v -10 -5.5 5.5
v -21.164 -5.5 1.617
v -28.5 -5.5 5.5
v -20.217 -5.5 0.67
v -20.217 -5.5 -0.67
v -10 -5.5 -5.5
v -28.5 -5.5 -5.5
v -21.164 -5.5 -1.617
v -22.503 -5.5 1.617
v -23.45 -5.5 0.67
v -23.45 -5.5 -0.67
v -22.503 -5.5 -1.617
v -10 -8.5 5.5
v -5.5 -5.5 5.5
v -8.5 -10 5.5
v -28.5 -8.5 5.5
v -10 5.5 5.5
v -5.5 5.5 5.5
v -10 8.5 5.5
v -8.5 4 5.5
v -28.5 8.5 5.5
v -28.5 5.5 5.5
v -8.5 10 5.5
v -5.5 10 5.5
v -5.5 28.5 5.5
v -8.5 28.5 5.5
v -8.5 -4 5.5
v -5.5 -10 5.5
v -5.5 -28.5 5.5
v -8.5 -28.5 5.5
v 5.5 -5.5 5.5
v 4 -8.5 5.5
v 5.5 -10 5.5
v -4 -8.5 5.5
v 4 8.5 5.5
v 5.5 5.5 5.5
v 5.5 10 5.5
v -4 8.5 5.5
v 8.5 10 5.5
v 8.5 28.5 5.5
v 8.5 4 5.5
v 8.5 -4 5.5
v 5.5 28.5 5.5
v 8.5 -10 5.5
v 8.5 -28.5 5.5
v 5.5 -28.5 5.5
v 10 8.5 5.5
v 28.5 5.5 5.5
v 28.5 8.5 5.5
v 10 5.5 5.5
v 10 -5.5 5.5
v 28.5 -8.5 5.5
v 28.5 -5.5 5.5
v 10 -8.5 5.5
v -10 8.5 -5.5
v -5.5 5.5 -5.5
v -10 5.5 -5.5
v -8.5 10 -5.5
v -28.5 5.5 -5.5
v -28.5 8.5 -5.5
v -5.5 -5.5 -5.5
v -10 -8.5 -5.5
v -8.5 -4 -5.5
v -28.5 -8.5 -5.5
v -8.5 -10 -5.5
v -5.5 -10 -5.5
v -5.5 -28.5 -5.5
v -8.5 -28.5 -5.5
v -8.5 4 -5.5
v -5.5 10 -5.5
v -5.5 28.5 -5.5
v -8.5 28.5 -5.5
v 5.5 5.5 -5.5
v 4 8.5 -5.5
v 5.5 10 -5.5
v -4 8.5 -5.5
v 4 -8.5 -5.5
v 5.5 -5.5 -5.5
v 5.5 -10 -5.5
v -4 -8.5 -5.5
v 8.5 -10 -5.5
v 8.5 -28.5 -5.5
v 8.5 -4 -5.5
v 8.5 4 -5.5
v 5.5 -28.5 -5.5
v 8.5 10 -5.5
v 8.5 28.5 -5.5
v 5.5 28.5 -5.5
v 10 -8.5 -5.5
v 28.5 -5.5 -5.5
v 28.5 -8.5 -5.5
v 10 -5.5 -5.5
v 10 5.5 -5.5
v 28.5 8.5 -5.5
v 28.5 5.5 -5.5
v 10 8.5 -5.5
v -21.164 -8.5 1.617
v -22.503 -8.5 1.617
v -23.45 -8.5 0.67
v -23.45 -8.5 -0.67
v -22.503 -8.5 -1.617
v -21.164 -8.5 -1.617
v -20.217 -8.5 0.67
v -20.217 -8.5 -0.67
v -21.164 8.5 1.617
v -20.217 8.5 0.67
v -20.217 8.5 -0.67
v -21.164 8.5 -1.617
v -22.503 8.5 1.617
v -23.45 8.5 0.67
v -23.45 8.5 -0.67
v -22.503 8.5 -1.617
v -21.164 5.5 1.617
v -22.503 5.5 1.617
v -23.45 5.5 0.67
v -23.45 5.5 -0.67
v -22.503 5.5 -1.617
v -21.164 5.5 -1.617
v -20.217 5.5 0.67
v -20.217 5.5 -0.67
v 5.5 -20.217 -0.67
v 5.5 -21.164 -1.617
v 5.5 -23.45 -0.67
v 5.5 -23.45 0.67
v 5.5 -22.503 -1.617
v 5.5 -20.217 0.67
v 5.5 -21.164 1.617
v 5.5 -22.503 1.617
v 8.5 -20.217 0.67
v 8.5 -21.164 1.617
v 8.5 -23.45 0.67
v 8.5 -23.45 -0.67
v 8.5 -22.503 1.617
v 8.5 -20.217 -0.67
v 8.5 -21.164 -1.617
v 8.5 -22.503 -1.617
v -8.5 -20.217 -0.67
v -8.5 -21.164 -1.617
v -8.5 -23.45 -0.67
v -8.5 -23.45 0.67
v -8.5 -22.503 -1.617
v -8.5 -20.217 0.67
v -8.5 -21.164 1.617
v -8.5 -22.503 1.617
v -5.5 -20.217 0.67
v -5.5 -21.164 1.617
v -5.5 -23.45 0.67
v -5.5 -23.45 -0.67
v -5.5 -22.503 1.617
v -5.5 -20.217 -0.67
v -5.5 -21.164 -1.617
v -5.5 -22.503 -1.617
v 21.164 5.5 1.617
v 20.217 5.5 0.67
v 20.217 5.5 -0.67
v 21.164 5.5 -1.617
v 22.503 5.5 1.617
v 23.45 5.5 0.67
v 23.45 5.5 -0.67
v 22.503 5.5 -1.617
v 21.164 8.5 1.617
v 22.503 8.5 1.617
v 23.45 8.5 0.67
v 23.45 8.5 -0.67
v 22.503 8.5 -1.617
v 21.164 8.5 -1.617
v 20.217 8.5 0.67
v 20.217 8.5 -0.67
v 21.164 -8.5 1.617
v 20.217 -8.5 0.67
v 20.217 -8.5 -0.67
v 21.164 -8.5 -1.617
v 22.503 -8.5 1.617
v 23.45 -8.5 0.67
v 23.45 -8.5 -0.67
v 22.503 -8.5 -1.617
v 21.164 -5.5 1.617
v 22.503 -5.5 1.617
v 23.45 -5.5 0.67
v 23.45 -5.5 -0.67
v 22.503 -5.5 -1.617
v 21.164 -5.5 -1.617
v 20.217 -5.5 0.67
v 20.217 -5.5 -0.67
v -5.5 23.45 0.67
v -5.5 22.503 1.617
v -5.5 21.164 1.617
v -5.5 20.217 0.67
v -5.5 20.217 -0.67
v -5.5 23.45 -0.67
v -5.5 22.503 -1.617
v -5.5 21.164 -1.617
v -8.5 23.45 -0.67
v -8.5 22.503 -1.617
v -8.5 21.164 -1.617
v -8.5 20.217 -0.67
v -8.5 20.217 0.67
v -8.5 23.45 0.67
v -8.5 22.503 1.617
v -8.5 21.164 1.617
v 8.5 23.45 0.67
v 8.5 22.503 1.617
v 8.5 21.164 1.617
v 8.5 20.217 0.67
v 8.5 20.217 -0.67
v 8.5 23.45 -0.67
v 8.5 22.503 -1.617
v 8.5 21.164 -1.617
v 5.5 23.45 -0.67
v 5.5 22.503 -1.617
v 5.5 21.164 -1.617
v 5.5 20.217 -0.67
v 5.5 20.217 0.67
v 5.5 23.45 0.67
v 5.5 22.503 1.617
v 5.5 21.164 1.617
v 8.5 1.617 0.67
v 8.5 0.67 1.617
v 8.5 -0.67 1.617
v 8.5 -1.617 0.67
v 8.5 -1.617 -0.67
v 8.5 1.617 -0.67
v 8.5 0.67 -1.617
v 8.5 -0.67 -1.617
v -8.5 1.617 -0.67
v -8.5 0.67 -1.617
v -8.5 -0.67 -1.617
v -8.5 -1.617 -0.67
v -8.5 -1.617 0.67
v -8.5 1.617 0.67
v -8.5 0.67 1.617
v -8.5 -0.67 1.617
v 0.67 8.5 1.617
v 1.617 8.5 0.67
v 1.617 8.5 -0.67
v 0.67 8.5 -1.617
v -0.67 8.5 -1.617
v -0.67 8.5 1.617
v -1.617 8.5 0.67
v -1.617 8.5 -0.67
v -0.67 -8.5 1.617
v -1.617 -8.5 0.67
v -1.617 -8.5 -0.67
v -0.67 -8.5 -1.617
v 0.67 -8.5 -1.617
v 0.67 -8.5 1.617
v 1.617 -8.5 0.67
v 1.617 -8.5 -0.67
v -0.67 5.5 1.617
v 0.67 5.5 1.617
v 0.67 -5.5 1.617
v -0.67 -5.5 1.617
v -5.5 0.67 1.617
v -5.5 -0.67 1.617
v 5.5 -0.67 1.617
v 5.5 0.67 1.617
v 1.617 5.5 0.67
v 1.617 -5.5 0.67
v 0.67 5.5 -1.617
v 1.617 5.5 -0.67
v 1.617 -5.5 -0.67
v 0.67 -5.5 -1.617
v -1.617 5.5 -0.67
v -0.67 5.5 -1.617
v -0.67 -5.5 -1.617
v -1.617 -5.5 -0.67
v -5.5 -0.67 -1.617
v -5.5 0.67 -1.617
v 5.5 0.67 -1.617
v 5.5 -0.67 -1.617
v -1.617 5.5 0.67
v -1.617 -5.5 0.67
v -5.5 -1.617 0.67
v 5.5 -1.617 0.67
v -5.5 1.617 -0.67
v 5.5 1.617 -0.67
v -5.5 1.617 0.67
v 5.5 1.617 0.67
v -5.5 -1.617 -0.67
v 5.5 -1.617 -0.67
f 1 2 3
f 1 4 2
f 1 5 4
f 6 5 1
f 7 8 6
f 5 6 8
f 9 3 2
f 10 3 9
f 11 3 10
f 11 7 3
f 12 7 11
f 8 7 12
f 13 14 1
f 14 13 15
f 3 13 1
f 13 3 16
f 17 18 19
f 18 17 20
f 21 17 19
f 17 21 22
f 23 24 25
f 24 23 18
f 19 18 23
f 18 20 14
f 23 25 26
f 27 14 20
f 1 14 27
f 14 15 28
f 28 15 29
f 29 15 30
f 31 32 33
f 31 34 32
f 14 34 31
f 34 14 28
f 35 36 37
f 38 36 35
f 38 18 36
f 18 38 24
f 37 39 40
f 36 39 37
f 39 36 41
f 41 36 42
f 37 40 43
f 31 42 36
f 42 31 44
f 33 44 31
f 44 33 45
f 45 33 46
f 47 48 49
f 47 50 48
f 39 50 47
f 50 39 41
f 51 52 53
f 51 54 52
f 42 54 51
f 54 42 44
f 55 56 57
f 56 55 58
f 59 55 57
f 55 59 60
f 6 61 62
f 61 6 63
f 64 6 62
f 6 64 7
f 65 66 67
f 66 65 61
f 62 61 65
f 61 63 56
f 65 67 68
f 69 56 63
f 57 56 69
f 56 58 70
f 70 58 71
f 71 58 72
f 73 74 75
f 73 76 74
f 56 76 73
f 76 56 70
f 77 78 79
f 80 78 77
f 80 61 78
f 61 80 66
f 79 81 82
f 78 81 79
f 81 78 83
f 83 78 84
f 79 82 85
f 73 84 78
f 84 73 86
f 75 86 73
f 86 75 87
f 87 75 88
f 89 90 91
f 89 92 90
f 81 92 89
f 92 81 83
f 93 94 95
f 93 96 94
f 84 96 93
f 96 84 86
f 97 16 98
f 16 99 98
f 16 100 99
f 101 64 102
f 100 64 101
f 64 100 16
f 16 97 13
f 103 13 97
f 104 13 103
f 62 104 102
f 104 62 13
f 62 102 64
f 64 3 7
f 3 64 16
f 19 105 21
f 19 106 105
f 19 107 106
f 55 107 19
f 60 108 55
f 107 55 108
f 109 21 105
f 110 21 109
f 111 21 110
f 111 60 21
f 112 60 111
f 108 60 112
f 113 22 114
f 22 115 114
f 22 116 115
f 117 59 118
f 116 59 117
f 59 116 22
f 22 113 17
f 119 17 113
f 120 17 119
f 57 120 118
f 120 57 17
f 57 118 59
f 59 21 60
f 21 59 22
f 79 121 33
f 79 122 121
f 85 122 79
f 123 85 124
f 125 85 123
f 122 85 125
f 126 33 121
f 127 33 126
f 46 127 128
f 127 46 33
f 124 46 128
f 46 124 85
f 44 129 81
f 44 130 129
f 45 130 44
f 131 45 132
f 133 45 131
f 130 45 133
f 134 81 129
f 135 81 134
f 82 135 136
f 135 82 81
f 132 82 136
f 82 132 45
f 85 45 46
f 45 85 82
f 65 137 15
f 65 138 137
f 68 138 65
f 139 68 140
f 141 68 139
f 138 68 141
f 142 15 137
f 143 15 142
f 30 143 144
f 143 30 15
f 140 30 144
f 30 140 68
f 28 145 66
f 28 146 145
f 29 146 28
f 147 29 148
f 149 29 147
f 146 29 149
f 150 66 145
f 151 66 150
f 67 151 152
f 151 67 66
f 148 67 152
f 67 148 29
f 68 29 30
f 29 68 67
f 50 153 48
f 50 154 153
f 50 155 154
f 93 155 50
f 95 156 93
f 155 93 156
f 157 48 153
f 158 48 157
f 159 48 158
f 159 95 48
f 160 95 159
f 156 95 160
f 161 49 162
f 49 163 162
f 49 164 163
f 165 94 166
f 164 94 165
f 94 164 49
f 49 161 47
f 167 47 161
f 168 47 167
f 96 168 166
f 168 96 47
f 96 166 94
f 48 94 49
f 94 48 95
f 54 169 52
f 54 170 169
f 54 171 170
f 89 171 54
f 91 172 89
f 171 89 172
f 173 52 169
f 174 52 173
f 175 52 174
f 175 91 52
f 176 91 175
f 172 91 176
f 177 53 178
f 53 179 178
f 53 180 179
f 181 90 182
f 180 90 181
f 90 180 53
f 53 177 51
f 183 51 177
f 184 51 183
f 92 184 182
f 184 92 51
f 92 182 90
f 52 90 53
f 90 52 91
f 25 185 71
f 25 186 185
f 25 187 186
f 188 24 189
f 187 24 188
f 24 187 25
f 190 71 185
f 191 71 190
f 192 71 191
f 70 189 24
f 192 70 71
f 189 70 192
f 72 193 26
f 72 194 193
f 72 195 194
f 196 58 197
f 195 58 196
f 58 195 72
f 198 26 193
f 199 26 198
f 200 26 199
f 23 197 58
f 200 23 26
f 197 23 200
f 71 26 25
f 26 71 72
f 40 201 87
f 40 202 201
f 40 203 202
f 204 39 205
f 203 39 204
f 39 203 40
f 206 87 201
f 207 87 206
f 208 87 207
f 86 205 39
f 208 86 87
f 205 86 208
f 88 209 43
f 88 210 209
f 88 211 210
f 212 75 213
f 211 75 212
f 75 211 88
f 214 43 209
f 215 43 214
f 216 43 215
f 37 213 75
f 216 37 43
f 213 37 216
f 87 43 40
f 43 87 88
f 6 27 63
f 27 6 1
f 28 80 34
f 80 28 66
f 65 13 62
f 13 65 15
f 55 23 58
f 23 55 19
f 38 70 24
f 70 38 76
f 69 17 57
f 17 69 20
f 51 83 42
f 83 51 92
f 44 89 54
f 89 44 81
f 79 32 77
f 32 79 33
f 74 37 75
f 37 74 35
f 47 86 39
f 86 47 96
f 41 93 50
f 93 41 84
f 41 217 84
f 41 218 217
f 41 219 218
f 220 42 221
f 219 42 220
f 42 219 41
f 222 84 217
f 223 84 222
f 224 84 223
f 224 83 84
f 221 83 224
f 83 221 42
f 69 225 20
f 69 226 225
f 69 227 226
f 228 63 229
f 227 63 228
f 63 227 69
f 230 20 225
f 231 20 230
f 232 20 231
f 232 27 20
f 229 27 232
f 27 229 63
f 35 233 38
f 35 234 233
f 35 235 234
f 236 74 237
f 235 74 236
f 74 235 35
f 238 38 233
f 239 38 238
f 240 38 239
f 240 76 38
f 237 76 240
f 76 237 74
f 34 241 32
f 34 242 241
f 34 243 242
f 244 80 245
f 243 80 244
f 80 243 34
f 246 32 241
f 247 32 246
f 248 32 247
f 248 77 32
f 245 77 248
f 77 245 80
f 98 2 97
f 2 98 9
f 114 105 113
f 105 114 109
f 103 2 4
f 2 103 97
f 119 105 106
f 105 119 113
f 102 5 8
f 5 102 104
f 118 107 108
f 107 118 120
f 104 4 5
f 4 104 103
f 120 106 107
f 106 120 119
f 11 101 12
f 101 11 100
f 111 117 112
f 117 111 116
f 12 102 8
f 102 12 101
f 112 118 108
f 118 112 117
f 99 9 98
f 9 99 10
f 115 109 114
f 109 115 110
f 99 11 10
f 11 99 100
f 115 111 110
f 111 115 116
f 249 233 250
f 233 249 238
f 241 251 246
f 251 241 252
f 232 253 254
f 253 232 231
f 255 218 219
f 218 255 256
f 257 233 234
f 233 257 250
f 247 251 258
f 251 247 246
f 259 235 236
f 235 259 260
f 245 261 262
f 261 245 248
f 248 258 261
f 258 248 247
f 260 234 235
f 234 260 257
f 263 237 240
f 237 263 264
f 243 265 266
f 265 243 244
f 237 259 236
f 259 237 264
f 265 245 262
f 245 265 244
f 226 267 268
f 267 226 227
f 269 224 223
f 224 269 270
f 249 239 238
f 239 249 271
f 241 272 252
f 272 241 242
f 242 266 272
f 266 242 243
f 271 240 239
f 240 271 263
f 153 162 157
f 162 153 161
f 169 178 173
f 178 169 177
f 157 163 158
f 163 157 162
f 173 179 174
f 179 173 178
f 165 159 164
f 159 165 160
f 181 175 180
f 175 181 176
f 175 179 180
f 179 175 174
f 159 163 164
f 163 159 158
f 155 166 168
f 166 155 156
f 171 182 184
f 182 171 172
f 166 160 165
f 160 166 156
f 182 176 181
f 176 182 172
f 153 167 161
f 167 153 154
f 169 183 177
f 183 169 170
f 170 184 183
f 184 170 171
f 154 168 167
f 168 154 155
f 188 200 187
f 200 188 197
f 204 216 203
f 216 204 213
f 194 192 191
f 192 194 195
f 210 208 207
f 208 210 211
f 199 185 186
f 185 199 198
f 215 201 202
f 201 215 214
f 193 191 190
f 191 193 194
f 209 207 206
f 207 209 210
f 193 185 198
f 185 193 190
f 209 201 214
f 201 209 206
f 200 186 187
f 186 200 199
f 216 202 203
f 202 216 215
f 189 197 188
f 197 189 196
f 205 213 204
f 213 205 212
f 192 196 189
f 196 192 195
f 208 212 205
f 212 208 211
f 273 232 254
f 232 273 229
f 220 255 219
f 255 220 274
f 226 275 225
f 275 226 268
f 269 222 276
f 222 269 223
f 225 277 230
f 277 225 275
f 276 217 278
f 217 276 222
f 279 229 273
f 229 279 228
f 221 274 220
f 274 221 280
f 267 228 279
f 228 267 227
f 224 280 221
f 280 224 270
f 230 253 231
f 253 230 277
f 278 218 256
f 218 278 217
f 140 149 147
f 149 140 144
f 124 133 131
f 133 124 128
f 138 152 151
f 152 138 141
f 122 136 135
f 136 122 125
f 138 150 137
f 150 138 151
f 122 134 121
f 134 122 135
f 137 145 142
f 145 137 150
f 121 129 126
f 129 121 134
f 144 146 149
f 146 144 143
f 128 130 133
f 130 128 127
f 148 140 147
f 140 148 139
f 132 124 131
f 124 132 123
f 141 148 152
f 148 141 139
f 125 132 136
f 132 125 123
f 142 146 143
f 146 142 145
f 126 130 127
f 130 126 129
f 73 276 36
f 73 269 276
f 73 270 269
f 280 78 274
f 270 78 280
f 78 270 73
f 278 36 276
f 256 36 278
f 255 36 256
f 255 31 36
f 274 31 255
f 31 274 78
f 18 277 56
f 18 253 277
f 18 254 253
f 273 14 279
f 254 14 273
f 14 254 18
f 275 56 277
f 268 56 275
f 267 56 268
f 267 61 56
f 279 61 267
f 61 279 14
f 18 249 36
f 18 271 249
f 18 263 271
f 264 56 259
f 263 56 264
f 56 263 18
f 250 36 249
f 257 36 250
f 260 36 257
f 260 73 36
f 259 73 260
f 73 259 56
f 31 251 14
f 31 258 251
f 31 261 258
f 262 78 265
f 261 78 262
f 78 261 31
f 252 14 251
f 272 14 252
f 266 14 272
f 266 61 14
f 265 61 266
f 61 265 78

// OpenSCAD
// beam width
w = 11;

// beam support length
l = 20;

// hole diameter
p = 3.5;

// material thickness
t = 3;

// 3 or 4 way joint
n = 4; // [ 2, 3, 4 ]

$fn = 8;


difference()
{
	union()
	{
		for ( z = [ 1 : n ] ) rz( z * 90 )
			for ( x = [ -1, +1 ] )
				txy( x*( t/2 + w/2 ), l/2 + w/2 + t )
					cbox( t, l, w );

		for ( a = [ -1, +1 ], b = [ -1, +1 ] )
			txy( a*w/2+a*t/2, b*w/2+b*t/2 )
				ccyl( r = t*1.5, h = w, $fn = 4 );

		cbox( w+t+t, w+t+t, w );
	}

	for ( a = [ -1, 0, +1 ] )
		tx( a*( l/3*2 + w/2 + t ) )
			rx( 90 )
				rz( 180/8 )
					ccyl( r = p/2, h = w+t*3 );

	for ( a = [ +1, 0, -1 ] )
		ty( a*( l/3*2 + w/2 + t ) )
			ry( 90 )
				rz( 180/8 )
					ccyl( r = p/2, h = w+t*3 );

	cbox( w, w, w*2 );
}


/// lazy.scad 1.2
/// a collection of useful macros for the lazy OpenSCAD programmer
/// http://www.thingiverse.com/thing:512443
// single axis translations
module tx( x ) translate( [ x, 0, 0 ] ) for(c=[0:$children-1])child(c);
module ty( y ) translate( [ 0, y, 0 ] ) for(c=[0:$children-1])child(c);
module tz( z ) translate( [ 0, 0, z ] ) for(c=[0:$children-1])child(c);
// 2d translations
module txy( x, y ) translate( [ x, y, 0 ] ) for(c=[0:$children-1])child(c);
module tyz( y, z ) translate( [ 0, y, z ] ) for(c=[0:$children-1])child(c);
module txz( x, z ) translate( [ x, 0, z ] ) for(c=[0:$children-1])child(c);
// 3d translation
module txyz( x, y, z ) translate( [ x, y, z ] ) for(c=[0:$children-1])child(c);
// single axis rotations
module rx( a ) rotate( [ a, 0, 0 ] ) for(c=[0:$children-1])child(c);
module ry( a ) rotate( [ 0, a, 0 ] ) for(c=[0:$children-1])child(c);
module rz( a ) rotate( [ 0, 0, a ] ) for(c=[0:$children-1])child(c);
// centered box (cube)
module cbox( x, y, z, t, xyz ) assign( s = (xyz==undef?[x,y,z]:xyz) ) if ( t == undef || t == 0 ) cube( s, center = true ); else difference() { cbox( xyz = (t>0?s:s-2*[t,t,t]) ); cbox( xyz = (t>0?s-2*[t,t,t]:s) ); }
// centered cylinder
module ccyl( d, h, d1, d2, r, r1, r2 )
cylinder( h = h, r = ( d == undef ? r : d/2 ), r1 = ( d1 == undef ? r1 : d1/2 ), r2 = ( d2 == undef ? r2 : d2 / 2 ), center = true );
/// end lazy.scad

